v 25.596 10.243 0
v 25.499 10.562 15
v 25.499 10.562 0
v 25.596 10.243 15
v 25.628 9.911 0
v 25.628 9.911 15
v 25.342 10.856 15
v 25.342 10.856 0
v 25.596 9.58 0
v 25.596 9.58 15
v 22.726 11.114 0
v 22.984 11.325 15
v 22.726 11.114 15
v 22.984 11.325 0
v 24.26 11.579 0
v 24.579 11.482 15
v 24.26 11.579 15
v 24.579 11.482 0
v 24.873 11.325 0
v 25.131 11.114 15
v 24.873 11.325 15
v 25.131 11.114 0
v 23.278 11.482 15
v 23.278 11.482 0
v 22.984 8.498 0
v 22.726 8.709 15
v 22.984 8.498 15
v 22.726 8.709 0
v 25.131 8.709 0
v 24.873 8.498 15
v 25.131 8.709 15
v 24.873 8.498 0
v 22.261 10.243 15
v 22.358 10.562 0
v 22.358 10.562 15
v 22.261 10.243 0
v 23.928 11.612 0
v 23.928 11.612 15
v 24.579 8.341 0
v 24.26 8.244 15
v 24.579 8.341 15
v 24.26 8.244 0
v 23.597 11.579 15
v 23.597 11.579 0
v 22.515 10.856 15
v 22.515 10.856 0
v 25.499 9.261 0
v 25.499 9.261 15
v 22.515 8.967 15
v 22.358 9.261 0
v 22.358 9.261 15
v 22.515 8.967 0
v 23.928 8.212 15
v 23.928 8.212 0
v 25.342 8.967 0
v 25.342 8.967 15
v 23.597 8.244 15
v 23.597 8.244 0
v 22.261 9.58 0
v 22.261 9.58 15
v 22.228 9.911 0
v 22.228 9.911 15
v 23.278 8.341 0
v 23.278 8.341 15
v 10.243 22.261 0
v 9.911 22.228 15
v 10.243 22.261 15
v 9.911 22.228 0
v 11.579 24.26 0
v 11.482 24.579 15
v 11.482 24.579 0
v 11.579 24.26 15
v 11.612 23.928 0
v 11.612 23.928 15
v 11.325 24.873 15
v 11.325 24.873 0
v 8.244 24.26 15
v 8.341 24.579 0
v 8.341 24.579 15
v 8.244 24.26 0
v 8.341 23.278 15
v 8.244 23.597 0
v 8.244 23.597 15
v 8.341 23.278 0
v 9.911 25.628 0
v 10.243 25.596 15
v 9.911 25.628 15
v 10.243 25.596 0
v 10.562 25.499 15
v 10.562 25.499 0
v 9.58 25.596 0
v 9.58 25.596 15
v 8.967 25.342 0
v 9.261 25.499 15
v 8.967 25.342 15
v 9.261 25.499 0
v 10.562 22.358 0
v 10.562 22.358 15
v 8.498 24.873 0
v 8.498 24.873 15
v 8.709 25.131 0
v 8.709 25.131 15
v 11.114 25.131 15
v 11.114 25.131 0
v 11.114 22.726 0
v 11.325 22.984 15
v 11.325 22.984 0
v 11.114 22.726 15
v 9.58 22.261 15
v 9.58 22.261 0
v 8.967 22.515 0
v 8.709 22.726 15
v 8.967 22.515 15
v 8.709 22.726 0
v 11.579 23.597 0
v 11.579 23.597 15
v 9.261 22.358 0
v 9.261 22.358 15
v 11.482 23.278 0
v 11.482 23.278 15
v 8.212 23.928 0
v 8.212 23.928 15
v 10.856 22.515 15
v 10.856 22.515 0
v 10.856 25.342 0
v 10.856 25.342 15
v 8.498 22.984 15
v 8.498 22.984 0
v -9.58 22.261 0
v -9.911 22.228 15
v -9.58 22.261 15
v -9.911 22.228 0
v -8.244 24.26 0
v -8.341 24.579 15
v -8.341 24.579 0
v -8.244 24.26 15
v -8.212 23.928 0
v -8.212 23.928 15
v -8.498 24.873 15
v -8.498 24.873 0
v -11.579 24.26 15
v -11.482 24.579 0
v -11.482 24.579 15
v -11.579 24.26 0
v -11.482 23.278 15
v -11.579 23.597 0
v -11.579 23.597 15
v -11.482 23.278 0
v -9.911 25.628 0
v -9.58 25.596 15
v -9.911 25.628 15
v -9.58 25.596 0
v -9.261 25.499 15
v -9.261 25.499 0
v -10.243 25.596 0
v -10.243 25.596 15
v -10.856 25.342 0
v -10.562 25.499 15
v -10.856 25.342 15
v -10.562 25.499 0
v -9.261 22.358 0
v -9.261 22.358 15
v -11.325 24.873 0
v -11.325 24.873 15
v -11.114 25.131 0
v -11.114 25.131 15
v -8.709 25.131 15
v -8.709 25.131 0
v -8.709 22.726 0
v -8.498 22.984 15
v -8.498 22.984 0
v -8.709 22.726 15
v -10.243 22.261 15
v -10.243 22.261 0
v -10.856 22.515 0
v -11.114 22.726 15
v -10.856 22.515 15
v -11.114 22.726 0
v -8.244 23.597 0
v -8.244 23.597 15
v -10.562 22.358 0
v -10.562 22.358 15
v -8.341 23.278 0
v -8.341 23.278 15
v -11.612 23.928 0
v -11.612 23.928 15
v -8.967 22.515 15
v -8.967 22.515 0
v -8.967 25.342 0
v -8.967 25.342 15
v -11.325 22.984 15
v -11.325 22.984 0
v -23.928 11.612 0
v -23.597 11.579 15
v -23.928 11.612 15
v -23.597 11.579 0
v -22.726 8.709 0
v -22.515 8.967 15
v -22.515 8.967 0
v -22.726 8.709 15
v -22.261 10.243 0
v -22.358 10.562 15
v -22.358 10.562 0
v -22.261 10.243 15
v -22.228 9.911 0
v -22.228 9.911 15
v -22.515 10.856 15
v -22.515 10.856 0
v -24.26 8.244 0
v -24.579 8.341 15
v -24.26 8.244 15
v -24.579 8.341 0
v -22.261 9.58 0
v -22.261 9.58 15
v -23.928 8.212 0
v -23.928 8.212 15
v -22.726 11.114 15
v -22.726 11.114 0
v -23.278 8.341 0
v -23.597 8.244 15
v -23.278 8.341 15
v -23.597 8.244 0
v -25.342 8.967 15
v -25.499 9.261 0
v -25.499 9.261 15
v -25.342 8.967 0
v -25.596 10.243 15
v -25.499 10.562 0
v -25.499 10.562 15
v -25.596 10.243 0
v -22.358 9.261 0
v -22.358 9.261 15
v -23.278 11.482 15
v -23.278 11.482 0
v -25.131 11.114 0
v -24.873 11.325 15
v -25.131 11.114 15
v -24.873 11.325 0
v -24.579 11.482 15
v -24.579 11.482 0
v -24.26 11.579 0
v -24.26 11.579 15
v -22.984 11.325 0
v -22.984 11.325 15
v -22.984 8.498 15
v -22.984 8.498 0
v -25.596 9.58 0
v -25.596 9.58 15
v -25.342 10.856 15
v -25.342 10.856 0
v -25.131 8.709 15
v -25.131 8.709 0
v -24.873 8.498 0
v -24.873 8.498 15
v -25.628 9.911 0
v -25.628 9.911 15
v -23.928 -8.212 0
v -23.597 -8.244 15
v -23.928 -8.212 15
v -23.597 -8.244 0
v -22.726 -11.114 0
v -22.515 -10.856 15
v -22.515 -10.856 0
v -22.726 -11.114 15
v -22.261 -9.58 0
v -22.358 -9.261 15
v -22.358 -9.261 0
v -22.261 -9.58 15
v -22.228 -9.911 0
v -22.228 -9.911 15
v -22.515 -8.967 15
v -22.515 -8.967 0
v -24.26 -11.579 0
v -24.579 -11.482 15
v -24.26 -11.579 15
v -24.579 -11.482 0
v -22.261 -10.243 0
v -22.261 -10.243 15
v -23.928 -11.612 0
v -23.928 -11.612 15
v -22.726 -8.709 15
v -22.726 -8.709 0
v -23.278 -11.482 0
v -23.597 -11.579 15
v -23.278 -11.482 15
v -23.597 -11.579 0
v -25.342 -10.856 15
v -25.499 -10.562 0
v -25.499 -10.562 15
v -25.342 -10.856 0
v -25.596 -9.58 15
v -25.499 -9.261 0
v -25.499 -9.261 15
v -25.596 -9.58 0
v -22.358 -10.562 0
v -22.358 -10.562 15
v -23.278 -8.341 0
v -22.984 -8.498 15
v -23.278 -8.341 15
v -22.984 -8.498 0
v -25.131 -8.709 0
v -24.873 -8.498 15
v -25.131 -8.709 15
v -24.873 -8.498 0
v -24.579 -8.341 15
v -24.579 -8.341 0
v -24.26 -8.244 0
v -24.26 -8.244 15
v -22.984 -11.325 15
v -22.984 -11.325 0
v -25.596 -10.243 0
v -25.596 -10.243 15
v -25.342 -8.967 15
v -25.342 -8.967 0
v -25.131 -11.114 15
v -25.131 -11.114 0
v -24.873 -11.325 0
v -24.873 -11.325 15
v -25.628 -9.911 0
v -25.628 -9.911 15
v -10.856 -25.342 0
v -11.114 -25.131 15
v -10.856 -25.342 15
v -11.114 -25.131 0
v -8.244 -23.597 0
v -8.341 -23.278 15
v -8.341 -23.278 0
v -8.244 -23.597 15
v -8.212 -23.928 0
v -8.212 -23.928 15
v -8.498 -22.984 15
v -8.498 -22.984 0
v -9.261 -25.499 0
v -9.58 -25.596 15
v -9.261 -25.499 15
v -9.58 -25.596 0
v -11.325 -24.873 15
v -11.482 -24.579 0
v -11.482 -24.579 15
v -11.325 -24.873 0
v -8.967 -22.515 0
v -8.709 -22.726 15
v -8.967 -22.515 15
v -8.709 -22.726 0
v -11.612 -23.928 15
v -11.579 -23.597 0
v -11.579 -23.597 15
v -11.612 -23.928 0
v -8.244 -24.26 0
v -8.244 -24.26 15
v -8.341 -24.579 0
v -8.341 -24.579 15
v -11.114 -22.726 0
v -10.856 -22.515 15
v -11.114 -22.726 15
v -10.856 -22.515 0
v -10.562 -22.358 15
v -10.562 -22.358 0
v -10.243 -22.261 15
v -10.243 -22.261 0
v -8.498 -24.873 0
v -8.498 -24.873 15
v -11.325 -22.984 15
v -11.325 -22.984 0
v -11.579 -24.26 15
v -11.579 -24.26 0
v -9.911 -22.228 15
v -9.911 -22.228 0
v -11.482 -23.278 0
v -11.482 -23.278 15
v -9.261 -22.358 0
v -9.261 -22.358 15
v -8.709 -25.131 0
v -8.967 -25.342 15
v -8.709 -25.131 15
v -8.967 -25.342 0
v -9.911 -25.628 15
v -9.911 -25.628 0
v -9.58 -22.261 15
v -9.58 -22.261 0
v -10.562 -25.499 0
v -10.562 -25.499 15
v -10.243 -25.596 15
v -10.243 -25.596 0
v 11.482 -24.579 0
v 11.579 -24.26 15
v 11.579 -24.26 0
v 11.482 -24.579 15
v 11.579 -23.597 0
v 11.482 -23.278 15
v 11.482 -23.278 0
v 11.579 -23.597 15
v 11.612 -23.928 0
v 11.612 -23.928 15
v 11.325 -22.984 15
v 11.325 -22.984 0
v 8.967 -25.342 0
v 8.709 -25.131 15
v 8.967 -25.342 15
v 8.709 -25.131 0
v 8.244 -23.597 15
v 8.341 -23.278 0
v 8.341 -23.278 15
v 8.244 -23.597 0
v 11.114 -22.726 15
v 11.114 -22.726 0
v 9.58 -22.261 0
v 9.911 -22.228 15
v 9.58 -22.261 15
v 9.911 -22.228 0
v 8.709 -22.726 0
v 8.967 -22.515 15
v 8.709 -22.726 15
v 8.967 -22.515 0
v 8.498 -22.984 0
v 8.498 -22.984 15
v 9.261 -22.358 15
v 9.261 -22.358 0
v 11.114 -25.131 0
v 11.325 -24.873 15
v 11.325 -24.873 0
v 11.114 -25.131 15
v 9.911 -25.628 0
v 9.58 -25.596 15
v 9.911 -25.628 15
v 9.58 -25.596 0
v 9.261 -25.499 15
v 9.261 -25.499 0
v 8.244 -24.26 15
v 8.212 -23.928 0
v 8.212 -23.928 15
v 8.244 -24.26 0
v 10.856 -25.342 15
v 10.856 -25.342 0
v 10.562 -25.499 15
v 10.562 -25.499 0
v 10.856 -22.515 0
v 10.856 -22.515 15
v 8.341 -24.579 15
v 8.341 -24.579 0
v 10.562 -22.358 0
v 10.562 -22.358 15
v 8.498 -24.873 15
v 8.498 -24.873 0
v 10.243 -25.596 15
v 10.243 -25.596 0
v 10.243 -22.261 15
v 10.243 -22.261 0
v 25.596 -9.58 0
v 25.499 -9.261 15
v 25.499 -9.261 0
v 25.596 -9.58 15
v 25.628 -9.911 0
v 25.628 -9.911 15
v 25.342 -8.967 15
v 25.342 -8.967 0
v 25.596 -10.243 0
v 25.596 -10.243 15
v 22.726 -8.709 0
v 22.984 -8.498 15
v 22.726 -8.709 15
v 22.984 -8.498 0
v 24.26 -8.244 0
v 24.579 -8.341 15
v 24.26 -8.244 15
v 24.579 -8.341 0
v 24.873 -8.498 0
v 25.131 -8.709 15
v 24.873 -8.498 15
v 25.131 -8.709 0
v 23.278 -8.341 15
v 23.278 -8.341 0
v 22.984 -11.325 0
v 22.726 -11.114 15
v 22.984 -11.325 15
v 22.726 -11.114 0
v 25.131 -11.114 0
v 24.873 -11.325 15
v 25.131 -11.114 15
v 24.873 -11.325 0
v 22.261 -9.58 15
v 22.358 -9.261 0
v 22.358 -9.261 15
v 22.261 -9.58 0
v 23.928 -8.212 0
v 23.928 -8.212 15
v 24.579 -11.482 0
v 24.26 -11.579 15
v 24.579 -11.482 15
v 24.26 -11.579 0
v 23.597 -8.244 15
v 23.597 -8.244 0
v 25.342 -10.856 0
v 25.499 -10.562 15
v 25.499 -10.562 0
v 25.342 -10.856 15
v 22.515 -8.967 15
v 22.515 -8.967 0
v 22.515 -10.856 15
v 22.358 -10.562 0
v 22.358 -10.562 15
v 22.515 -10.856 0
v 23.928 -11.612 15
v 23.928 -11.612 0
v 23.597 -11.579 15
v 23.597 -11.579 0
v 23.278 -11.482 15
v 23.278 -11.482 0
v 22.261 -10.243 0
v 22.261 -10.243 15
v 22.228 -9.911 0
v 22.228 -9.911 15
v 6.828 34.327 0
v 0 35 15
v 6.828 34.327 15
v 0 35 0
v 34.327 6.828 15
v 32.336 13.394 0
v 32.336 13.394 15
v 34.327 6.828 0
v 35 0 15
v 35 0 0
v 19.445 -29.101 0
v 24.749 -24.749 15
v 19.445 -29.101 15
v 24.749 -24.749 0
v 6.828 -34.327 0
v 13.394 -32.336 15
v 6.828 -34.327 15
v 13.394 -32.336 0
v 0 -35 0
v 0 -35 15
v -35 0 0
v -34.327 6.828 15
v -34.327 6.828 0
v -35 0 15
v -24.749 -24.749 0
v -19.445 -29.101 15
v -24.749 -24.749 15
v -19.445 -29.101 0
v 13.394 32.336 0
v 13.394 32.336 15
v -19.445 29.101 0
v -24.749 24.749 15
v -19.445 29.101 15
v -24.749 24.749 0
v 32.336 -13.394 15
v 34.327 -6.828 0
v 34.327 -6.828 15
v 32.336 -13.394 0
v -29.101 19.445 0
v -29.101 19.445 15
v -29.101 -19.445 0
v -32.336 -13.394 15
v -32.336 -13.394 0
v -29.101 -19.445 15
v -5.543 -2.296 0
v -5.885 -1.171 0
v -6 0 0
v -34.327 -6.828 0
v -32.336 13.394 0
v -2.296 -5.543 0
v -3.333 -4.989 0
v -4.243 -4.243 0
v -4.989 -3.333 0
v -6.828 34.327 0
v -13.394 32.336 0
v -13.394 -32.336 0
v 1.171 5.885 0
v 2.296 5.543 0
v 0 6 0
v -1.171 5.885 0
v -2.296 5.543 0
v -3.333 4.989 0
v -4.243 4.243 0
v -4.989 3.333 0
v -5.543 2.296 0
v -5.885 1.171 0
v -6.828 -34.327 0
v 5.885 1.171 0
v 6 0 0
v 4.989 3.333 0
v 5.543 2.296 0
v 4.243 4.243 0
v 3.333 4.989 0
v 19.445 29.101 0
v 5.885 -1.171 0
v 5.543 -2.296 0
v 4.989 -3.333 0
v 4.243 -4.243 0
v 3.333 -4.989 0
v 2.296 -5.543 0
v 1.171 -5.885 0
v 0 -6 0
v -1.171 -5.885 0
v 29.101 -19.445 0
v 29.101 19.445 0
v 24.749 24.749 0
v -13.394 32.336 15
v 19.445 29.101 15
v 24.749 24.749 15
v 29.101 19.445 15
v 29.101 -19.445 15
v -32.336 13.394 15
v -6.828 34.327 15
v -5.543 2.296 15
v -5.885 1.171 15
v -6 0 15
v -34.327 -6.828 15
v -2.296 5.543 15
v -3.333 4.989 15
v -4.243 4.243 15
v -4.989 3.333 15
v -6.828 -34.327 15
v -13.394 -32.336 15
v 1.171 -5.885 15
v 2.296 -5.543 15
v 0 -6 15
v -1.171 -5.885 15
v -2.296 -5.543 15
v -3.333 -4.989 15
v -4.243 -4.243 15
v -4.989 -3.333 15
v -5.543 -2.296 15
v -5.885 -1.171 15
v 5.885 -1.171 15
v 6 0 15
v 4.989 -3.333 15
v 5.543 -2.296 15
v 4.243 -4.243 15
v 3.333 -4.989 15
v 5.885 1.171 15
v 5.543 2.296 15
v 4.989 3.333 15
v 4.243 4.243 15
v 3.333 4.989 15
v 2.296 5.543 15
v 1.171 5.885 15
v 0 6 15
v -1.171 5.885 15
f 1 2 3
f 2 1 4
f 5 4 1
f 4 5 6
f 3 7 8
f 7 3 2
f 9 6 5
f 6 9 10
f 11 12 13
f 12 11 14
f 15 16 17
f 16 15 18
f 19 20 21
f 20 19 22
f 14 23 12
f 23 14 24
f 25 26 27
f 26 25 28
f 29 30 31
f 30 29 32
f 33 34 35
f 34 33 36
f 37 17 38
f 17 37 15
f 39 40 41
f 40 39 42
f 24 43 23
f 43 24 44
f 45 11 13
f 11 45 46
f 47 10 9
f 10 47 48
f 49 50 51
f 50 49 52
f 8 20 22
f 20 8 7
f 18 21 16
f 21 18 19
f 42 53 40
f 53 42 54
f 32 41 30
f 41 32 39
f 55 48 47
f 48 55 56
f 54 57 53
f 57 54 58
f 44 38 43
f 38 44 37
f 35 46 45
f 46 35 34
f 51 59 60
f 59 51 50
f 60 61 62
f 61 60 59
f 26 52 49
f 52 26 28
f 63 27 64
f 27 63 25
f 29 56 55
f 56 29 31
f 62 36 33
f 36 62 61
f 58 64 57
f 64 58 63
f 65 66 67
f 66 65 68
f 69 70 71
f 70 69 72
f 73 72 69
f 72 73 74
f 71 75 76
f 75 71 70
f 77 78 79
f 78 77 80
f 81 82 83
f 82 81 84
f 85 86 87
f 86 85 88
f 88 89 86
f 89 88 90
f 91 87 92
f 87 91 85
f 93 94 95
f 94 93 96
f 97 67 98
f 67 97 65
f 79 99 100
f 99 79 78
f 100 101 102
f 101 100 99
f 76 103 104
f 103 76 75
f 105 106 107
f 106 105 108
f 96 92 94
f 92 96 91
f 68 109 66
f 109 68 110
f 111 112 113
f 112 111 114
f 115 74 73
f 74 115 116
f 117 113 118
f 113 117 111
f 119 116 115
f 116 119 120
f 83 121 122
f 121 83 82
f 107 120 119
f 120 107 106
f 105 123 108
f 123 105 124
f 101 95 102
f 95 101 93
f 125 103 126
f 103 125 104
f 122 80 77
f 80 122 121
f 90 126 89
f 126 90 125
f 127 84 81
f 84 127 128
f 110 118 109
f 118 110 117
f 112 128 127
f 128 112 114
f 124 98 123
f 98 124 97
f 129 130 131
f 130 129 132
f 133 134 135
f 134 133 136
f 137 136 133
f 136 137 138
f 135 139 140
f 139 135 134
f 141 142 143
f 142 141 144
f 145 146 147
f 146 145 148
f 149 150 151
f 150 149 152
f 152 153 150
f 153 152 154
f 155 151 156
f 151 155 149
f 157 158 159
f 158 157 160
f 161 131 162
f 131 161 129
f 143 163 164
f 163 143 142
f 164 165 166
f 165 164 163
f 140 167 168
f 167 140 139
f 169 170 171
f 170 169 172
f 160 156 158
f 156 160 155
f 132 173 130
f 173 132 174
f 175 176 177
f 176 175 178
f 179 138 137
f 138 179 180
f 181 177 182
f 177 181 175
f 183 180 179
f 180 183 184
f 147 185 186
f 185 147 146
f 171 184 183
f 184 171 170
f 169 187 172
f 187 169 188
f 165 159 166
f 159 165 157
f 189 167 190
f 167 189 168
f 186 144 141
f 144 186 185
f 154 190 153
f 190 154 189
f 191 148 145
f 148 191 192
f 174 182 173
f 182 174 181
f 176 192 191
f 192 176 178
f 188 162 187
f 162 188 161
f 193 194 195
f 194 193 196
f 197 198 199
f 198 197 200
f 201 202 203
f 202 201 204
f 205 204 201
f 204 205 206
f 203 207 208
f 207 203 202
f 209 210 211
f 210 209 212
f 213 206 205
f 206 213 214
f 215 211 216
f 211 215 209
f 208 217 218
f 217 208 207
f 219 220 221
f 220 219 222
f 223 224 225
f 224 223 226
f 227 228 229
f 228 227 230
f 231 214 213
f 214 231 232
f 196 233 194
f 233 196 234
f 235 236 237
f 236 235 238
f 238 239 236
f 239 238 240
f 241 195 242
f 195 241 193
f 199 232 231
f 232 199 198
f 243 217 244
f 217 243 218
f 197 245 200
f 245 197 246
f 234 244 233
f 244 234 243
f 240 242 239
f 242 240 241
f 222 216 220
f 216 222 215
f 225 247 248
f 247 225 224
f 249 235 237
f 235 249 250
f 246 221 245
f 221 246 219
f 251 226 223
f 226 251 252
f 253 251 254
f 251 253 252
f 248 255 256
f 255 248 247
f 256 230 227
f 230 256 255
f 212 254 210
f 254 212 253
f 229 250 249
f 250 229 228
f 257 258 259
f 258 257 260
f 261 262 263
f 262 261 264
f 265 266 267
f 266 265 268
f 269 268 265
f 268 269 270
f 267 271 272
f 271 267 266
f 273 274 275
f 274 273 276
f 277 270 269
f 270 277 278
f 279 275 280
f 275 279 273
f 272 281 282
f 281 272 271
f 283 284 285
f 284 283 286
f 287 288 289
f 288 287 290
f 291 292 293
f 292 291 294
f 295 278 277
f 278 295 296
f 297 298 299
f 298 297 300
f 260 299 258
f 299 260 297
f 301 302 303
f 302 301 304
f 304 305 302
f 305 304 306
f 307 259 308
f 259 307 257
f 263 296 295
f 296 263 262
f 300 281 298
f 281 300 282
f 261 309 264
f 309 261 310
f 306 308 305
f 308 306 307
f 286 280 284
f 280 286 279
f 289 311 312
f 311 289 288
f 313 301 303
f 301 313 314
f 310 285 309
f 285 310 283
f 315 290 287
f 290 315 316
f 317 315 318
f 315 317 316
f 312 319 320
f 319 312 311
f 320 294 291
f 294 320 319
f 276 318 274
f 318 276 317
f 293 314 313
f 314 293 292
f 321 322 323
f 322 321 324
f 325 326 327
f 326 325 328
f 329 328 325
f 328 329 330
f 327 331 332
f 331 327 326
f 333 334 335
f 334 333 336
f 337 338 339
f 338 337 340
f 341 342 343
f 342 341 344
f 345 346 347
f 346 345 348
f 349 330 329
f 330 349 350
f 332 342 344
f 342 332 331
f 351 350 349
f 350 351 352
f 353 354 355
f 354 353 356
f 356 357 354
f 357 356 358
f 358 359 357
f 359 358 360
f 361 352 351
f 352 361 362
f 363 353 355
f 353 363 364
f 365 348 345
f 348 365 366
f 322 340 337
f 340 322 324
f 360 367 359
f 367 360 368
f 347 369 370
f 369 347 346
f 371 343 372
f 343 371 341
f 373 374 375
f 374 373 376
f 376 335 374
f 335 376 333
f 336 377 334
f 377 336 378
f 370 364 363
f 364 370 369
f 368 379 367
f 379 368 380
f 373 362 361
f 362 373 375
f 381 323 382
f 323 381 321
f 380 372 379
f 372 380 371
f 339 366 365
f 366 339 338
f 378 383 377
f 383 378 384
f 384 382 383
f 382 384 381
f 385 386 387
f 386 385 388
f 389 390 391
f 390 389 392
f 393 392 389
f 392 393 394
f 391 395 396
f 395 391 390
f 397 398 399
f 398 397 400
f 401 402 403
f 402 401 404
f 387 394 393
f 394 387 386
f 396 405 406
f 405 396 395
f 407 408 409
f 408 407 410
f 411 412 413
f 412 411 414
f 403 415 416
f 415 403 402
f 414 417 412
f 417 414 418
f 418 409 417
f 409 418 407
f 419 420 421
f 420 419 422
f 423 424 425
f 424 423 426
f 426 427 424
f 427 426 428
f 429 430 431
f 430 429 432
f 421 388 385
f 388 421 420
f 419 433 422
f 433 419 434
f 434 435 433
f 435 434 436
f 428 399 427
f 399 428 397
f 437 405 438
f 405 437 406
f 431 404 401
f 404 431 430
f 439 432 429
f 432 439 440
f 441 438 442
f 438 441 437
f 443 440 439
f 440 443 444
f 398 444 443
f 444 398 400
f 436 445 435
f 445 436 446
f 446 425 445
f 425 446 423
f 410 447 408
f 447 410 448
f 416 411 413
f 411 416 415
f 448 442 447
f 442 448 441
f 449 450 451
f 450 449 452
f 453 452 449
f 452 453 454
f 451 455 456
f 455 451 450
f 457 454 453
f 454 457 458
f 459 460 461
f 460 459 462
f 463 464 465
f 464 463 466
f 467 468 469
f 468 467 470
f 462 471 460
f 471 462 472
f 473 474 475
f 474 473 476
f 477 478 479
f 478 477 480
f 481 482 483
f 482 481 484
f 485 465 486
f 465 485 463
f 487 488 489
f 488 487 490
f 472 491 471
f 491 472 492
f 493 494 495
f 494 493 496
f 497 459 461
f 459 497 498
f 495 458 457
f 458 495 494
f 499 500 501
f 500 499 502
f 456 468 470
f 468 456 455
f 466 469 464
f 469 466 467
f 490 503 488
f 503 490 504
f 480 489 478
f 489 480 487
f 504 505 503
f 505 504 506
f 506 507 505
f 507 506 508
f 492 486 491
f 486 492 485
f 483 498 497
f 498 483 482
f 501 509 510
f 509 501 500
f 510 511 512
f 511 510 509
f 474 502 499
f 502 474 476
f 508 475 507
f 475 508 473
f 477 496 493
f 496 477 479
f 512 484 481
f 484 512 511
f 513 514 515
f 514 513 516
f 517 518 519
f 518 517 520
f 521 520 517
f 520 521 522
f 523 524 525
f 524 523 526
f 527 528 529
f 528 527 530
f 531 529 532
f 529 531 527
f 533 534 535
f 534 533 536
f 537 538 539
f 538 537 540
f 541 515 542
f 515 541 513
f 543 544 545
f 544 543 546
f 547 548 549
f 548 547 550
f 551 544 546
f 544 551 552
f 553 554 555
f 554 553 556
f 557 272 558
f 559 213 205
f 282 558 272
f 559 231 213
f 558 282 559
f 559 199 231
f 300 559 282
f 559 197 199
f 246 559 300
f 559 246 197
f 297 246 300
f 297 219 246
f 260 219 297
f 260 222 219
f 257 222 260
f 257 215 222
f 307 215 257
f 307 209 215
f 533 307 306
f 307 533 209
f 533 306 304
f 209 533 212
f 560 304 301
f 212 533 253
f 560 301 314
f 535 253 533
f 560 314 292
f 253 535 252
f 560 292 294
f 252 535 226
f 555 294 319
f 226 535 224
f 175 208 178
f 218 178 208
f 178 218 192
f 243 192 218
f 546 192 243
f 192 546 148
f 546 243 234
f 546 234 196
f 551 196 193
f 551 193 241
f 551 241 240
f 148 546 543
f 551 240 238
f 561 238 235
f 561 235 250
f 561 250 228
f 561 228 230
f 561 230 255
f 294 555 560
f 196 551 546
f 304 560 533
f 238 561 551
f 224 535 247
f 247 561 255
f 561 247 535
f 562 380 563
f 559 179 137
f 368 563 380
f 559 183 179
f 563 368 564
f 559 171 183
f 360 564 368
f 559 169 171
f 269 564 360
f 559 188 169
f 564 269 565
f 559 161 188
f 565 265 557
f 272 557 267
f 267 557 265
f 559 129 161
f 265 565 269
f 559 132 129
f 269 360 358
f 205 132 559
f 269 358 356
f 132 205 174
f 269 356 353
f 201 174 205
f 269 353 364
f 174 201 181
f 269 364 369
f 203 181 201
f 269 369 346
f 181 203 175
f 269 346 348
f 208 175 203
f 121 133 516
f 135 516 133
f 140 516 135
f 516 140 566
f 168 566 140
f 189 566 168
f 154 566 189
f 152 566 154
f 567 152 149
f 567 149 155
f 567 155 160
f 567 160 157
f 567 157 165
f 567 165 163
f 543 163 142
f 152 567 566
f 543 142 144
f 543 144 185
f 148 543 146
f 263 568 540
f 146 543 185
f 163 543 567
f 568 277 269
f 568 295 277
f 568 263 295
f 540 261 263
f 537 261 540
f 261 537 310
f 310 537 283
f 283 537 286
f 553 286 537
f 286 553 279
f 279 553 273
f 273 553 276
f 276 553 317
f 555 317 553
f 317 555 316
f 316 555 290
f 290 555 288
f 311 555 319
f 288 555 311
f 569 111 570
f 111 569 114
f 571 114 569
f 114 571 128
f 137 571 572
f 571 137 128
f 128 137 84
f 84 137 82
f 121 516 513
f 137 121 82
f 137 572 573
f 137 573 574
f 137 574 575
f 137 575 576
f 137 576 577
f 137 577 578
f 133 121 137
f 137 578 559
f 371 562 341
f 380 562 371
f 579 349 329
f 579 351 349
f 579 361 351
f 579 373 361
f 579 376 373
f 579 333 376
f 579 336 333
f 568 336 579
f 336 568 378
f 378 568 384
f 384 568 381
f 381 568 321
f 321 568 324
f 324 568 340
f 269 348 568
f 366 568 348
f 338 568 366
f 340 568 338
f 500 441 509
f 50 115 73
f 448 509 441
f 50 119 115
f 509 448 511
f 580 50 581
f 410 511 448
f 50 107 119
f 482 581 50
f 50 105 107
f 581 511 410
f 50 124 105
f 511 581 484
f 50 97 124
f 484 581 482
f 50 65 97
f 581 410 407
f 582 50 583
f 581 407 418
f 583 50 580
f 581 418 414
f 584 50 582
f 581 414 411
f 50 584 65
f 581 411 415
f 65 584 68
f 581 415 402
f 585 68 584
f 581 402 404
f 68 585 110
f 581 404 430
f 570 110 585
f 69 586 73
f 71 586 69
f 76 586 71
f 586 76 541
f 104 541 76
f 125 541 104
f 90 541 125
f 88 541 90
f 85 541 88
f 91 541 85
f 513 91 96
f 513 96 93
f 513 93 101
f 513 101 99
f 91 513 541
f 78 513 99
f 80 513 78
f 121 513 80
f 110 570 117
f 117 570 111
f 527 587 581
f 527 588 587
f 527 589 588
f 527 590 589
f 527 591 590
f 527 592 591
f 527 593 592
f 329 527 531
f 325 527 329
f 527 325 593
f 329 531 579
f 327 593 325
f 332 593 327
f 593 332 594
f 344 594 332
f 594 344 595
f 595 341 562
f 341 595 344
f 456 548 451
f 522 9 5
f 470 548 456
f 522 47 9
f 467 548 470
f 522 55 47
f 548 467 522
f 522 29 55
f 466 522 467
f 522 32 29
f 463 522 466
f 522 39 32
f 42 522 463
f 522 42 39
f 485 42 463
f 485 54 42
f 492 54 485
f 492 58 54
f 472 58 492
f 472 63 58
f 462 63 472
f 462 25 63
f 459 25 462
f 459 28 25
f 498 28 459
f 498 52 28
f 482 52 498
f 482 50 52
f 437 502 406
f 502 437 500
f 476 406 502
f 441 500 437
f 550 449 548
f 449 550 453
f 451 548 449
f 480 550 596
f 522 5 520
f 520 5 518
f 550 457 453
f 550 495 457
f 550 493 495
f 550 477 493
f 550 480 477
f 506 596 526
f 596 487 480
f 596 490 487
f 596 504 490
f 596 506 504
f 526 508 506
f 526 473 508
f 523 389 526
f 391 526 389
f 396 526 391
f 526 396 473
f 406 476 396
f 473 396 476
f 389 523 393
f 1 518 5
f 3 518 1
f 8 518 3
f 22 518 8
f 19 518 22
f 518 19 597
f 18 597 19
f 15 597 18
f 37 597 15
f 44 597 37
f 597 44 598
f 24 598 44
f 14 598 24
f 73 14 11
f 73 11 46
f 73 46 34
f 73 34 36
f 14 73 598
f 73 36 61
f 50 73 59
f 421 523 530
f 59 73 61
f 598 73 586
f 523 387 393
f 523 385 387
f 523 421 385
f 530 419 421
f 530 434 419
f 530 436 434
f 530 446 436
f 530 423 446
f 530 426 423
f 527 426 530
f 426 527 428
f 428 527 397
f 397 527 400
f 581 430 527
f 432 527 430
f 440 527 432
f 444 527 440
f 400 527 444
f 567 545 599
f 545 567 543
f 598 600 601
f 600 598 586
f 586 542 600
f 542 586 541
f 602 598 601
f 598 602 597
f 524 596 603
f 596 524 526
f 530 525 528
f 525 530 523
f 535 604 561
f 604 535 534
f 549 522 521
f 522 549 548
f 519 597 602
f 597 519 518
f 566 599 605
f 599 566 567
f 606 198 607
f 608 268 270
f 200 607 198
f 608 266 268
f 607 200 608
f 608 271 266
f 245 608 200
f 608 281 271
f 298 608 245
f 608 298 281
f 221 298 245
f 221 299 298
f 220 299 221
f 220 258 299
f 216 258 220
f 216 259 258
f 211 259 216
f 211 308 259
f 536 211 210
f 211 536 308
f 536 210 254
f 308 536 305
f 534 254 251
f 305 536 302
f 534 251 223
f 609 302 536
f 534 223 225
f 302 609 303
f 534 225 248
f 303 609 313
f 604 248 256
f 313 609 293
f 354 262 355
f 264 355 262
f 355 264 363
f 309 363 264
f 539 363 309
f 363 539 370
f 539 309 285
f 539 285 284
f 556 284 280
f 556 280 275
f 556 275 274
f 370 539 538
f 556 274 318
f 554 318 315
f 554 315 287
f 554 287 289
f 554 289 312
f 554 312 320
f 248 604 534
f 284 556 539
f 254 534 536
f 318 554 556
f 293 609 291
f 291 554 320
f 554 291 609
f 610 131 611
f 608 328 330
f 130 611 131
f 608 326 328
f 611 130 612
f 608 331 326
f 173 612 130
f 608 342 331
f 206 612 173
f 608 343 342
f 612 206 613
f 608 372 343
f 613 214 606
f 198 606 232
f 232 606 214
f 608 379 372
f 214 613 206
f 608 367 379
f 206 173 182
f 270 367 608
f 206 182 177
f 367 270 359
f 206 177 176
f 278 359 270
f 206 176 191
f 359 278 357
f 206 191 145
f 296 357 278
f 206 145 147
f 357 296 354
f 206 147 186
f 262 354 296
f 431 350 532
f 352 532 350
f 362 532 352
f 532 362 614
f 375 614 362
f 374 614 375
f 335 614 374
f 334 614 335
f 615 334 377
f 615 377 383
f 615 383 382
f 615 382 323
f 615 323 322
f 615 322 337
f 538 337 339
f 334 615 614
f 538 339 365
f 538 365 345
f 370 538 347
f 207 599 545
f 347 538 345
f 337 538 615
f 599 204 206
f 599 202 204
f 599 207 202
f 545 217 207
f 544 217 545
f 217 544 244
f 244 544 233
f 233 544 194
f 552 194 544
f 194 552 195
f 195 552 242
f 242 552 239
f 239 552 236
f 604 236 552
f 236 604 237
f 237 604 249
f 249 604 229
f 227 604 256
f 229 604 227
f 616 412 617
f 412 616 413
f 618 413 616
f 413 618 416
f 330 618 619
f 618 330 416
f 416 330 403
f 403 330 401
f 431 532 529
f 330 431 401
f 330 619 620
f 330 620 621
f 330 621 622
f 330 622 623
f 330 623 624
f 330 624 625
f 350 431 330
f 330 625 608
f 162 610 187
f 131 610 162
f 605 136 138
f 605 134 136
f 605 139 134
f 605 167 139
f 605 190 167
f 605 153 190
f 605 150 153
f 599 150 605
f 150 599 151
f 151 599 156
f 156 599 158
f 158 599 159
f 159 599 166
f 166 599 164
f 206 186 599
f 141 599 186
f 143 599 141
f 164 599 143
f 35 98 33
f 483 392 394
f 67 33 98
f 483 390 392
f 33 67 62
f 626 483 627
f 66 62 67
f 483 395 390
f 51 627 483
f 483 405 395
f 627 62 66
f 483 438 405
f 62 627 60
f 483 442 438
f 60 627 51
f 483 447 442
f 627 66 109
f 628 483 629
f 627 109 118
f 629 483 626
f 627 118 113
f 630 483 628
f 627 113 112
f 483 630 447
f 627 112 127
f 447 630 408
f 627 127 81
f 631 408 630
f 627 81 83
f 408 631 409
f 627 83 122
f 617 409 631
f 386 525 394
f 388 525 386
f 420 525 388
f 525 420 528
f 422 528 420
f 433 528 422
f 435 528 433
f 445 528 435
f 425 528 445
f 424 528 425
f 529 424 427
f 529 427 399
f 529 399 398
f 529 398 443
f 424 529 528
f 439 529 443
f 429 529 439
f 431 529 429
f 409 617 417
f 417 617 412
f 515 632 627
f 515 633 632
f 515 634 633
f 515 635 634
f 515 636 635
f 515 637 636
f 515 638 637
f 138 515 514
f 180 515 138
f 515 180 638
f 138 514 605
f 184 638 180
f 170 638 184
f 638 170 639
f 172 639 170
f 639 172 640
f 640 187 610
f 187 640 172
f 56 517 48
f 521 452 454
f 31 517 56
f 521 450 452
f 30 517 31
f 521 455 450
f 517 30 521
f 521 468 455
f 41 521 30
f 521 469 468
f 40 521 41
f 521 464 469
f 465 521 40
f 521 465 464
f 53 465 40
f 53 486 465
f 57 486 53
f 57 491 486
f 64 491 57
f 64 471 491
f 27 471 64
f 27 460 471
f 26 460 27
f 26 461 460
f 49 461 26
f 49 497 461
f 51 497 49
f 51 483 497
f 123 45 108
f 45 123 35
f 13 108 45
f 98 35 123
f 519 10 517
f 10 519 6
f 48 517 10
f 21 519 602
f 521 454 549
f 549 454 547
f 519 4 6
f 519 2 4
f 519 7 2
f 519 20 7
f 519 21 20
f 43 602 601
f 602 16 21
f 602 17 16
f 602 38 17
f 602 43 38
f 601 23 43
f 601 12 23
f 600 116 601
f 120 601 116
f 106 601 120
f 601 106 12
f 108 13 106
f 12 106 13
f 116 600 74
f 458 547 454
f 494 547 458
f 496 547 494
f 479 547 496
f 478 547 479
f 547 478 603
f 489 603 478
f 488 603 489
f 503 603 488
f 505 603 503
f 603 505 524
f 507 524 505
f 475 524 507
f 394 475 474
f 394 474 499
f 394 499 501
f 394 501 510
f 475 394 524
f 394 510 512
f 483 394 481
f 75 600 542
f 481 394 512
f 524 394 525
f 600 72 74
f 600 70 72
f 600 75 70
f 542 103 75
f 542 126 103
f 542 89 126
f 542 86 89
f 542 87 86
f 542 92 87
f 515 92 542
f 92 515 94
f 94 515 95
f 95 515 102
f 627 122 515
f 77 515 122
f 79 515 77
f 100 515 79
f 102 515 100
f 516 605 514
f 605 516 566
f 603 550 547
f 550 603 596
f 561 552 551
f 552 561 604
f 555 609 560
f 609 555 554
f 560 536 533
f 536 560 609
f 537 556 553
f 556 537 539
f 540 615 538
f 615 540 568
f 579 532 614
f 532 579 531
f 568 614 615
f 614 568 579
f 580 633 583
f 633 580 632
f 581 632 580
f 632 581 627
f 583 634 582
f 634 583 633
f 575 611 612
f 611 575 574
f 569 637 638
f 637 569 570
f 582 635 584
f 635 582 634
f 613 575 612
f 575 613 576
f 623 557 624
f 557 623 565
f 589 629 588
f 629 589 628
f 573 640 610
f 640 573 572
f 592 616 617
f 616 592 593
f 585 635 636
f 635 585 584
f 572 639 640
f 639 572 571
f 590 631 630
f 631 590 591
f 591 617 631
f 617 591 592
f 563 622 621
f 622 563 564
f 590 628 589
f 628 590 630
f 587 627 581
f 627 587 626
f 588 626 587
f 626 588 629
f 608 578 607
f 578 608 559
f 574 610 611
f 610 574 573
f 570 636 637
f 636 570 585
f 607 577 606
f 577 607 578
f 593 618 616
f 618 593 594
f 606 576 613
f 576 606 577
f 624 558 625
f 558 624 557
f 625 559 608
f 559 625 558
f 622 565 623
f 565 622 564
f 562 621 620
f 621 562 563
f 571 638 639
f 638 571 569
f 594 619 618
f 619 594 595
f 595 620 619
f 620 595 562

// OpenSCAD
$fn = 32;

// ----------------------------------------------------------------------
// Flange Ø70 x 15
// 8 holes on a Ø51.8 bolt circle, bolted joints
// ----------------------------------------------------------------------

// --- parameters (mm) ---
flange_d = 70;     // outside diameter of the flange
thickness = 15;    // flange thickness
holes = 8;         // number of bolt holes
pcd = 51.8;        // bolt circle diameter
start_deg = 22.5;  // angle of the first hole, from +X
hole_d = 3.4;      // bolt hole diameter
bore_d = 12;       // central through bore
hub_d = 22;        // hub outside diameter
hub_h = 0;         // hub height above the flange face (0 = no hub)

// --- derived feature positions (mm) ---
height = thickness + hub_h;  // = 15   overall height of the part
pcd_r = pcd / 2;             // = 25.9   bolt circle radius
hole_step = 360 / holes;     // = 45   angular pitch
feature_centers = [
  [pcd_r * cos(start_deg + 0 * hole_step), pcd_r * sin(start_deg + 0 * hole_step)],
  [pcd_r * cos(start_deg + 1 * hole_step), pcd_r * sin(start_deg + 1 * hole_step)],
  [pcd_r * cos(start_deg + 2 * hole_step), pcd_r * sin(start_deg + 2 * hole_step)],
  [pcd_r * cos(start_deg + 3 * hole_step), pcd_r * sin(start_deg + 3 * hole_step)],
  [pcd_r * cos(start_deg + 4 * hole_step), pcd_r * sin(start_deg + 4 * hole_step)],
  [pcd_r * cos(start_deg + 5 * hole_step), pcd_r * sin(start_deg + 5 * hole_step)],
  [pcd_r * cos(start_deg + 6 * hole_step), pcd_r * sin(start_deg + 6 * hole_step)],
  [pcd_r * cos(start_deg + 7 * hole_step), pcd_r * sin(start_deg + 7 * hole_step)]
];   // bolt hole centres on the pitch circle

// flange disc, every hole and the bore cut straight through
difference() {
  union() {
    cylinder(d = flange_d, h = thickness);
  }
  translate([0, 0, -1]) cylinder(d = bore_d, h = height + 2);  // bore, through
  for (centre = feature_centers)
    translate([centre[0], centre[1], -1]) cylinder(d = hole_d, h = thickness + 2);
}
